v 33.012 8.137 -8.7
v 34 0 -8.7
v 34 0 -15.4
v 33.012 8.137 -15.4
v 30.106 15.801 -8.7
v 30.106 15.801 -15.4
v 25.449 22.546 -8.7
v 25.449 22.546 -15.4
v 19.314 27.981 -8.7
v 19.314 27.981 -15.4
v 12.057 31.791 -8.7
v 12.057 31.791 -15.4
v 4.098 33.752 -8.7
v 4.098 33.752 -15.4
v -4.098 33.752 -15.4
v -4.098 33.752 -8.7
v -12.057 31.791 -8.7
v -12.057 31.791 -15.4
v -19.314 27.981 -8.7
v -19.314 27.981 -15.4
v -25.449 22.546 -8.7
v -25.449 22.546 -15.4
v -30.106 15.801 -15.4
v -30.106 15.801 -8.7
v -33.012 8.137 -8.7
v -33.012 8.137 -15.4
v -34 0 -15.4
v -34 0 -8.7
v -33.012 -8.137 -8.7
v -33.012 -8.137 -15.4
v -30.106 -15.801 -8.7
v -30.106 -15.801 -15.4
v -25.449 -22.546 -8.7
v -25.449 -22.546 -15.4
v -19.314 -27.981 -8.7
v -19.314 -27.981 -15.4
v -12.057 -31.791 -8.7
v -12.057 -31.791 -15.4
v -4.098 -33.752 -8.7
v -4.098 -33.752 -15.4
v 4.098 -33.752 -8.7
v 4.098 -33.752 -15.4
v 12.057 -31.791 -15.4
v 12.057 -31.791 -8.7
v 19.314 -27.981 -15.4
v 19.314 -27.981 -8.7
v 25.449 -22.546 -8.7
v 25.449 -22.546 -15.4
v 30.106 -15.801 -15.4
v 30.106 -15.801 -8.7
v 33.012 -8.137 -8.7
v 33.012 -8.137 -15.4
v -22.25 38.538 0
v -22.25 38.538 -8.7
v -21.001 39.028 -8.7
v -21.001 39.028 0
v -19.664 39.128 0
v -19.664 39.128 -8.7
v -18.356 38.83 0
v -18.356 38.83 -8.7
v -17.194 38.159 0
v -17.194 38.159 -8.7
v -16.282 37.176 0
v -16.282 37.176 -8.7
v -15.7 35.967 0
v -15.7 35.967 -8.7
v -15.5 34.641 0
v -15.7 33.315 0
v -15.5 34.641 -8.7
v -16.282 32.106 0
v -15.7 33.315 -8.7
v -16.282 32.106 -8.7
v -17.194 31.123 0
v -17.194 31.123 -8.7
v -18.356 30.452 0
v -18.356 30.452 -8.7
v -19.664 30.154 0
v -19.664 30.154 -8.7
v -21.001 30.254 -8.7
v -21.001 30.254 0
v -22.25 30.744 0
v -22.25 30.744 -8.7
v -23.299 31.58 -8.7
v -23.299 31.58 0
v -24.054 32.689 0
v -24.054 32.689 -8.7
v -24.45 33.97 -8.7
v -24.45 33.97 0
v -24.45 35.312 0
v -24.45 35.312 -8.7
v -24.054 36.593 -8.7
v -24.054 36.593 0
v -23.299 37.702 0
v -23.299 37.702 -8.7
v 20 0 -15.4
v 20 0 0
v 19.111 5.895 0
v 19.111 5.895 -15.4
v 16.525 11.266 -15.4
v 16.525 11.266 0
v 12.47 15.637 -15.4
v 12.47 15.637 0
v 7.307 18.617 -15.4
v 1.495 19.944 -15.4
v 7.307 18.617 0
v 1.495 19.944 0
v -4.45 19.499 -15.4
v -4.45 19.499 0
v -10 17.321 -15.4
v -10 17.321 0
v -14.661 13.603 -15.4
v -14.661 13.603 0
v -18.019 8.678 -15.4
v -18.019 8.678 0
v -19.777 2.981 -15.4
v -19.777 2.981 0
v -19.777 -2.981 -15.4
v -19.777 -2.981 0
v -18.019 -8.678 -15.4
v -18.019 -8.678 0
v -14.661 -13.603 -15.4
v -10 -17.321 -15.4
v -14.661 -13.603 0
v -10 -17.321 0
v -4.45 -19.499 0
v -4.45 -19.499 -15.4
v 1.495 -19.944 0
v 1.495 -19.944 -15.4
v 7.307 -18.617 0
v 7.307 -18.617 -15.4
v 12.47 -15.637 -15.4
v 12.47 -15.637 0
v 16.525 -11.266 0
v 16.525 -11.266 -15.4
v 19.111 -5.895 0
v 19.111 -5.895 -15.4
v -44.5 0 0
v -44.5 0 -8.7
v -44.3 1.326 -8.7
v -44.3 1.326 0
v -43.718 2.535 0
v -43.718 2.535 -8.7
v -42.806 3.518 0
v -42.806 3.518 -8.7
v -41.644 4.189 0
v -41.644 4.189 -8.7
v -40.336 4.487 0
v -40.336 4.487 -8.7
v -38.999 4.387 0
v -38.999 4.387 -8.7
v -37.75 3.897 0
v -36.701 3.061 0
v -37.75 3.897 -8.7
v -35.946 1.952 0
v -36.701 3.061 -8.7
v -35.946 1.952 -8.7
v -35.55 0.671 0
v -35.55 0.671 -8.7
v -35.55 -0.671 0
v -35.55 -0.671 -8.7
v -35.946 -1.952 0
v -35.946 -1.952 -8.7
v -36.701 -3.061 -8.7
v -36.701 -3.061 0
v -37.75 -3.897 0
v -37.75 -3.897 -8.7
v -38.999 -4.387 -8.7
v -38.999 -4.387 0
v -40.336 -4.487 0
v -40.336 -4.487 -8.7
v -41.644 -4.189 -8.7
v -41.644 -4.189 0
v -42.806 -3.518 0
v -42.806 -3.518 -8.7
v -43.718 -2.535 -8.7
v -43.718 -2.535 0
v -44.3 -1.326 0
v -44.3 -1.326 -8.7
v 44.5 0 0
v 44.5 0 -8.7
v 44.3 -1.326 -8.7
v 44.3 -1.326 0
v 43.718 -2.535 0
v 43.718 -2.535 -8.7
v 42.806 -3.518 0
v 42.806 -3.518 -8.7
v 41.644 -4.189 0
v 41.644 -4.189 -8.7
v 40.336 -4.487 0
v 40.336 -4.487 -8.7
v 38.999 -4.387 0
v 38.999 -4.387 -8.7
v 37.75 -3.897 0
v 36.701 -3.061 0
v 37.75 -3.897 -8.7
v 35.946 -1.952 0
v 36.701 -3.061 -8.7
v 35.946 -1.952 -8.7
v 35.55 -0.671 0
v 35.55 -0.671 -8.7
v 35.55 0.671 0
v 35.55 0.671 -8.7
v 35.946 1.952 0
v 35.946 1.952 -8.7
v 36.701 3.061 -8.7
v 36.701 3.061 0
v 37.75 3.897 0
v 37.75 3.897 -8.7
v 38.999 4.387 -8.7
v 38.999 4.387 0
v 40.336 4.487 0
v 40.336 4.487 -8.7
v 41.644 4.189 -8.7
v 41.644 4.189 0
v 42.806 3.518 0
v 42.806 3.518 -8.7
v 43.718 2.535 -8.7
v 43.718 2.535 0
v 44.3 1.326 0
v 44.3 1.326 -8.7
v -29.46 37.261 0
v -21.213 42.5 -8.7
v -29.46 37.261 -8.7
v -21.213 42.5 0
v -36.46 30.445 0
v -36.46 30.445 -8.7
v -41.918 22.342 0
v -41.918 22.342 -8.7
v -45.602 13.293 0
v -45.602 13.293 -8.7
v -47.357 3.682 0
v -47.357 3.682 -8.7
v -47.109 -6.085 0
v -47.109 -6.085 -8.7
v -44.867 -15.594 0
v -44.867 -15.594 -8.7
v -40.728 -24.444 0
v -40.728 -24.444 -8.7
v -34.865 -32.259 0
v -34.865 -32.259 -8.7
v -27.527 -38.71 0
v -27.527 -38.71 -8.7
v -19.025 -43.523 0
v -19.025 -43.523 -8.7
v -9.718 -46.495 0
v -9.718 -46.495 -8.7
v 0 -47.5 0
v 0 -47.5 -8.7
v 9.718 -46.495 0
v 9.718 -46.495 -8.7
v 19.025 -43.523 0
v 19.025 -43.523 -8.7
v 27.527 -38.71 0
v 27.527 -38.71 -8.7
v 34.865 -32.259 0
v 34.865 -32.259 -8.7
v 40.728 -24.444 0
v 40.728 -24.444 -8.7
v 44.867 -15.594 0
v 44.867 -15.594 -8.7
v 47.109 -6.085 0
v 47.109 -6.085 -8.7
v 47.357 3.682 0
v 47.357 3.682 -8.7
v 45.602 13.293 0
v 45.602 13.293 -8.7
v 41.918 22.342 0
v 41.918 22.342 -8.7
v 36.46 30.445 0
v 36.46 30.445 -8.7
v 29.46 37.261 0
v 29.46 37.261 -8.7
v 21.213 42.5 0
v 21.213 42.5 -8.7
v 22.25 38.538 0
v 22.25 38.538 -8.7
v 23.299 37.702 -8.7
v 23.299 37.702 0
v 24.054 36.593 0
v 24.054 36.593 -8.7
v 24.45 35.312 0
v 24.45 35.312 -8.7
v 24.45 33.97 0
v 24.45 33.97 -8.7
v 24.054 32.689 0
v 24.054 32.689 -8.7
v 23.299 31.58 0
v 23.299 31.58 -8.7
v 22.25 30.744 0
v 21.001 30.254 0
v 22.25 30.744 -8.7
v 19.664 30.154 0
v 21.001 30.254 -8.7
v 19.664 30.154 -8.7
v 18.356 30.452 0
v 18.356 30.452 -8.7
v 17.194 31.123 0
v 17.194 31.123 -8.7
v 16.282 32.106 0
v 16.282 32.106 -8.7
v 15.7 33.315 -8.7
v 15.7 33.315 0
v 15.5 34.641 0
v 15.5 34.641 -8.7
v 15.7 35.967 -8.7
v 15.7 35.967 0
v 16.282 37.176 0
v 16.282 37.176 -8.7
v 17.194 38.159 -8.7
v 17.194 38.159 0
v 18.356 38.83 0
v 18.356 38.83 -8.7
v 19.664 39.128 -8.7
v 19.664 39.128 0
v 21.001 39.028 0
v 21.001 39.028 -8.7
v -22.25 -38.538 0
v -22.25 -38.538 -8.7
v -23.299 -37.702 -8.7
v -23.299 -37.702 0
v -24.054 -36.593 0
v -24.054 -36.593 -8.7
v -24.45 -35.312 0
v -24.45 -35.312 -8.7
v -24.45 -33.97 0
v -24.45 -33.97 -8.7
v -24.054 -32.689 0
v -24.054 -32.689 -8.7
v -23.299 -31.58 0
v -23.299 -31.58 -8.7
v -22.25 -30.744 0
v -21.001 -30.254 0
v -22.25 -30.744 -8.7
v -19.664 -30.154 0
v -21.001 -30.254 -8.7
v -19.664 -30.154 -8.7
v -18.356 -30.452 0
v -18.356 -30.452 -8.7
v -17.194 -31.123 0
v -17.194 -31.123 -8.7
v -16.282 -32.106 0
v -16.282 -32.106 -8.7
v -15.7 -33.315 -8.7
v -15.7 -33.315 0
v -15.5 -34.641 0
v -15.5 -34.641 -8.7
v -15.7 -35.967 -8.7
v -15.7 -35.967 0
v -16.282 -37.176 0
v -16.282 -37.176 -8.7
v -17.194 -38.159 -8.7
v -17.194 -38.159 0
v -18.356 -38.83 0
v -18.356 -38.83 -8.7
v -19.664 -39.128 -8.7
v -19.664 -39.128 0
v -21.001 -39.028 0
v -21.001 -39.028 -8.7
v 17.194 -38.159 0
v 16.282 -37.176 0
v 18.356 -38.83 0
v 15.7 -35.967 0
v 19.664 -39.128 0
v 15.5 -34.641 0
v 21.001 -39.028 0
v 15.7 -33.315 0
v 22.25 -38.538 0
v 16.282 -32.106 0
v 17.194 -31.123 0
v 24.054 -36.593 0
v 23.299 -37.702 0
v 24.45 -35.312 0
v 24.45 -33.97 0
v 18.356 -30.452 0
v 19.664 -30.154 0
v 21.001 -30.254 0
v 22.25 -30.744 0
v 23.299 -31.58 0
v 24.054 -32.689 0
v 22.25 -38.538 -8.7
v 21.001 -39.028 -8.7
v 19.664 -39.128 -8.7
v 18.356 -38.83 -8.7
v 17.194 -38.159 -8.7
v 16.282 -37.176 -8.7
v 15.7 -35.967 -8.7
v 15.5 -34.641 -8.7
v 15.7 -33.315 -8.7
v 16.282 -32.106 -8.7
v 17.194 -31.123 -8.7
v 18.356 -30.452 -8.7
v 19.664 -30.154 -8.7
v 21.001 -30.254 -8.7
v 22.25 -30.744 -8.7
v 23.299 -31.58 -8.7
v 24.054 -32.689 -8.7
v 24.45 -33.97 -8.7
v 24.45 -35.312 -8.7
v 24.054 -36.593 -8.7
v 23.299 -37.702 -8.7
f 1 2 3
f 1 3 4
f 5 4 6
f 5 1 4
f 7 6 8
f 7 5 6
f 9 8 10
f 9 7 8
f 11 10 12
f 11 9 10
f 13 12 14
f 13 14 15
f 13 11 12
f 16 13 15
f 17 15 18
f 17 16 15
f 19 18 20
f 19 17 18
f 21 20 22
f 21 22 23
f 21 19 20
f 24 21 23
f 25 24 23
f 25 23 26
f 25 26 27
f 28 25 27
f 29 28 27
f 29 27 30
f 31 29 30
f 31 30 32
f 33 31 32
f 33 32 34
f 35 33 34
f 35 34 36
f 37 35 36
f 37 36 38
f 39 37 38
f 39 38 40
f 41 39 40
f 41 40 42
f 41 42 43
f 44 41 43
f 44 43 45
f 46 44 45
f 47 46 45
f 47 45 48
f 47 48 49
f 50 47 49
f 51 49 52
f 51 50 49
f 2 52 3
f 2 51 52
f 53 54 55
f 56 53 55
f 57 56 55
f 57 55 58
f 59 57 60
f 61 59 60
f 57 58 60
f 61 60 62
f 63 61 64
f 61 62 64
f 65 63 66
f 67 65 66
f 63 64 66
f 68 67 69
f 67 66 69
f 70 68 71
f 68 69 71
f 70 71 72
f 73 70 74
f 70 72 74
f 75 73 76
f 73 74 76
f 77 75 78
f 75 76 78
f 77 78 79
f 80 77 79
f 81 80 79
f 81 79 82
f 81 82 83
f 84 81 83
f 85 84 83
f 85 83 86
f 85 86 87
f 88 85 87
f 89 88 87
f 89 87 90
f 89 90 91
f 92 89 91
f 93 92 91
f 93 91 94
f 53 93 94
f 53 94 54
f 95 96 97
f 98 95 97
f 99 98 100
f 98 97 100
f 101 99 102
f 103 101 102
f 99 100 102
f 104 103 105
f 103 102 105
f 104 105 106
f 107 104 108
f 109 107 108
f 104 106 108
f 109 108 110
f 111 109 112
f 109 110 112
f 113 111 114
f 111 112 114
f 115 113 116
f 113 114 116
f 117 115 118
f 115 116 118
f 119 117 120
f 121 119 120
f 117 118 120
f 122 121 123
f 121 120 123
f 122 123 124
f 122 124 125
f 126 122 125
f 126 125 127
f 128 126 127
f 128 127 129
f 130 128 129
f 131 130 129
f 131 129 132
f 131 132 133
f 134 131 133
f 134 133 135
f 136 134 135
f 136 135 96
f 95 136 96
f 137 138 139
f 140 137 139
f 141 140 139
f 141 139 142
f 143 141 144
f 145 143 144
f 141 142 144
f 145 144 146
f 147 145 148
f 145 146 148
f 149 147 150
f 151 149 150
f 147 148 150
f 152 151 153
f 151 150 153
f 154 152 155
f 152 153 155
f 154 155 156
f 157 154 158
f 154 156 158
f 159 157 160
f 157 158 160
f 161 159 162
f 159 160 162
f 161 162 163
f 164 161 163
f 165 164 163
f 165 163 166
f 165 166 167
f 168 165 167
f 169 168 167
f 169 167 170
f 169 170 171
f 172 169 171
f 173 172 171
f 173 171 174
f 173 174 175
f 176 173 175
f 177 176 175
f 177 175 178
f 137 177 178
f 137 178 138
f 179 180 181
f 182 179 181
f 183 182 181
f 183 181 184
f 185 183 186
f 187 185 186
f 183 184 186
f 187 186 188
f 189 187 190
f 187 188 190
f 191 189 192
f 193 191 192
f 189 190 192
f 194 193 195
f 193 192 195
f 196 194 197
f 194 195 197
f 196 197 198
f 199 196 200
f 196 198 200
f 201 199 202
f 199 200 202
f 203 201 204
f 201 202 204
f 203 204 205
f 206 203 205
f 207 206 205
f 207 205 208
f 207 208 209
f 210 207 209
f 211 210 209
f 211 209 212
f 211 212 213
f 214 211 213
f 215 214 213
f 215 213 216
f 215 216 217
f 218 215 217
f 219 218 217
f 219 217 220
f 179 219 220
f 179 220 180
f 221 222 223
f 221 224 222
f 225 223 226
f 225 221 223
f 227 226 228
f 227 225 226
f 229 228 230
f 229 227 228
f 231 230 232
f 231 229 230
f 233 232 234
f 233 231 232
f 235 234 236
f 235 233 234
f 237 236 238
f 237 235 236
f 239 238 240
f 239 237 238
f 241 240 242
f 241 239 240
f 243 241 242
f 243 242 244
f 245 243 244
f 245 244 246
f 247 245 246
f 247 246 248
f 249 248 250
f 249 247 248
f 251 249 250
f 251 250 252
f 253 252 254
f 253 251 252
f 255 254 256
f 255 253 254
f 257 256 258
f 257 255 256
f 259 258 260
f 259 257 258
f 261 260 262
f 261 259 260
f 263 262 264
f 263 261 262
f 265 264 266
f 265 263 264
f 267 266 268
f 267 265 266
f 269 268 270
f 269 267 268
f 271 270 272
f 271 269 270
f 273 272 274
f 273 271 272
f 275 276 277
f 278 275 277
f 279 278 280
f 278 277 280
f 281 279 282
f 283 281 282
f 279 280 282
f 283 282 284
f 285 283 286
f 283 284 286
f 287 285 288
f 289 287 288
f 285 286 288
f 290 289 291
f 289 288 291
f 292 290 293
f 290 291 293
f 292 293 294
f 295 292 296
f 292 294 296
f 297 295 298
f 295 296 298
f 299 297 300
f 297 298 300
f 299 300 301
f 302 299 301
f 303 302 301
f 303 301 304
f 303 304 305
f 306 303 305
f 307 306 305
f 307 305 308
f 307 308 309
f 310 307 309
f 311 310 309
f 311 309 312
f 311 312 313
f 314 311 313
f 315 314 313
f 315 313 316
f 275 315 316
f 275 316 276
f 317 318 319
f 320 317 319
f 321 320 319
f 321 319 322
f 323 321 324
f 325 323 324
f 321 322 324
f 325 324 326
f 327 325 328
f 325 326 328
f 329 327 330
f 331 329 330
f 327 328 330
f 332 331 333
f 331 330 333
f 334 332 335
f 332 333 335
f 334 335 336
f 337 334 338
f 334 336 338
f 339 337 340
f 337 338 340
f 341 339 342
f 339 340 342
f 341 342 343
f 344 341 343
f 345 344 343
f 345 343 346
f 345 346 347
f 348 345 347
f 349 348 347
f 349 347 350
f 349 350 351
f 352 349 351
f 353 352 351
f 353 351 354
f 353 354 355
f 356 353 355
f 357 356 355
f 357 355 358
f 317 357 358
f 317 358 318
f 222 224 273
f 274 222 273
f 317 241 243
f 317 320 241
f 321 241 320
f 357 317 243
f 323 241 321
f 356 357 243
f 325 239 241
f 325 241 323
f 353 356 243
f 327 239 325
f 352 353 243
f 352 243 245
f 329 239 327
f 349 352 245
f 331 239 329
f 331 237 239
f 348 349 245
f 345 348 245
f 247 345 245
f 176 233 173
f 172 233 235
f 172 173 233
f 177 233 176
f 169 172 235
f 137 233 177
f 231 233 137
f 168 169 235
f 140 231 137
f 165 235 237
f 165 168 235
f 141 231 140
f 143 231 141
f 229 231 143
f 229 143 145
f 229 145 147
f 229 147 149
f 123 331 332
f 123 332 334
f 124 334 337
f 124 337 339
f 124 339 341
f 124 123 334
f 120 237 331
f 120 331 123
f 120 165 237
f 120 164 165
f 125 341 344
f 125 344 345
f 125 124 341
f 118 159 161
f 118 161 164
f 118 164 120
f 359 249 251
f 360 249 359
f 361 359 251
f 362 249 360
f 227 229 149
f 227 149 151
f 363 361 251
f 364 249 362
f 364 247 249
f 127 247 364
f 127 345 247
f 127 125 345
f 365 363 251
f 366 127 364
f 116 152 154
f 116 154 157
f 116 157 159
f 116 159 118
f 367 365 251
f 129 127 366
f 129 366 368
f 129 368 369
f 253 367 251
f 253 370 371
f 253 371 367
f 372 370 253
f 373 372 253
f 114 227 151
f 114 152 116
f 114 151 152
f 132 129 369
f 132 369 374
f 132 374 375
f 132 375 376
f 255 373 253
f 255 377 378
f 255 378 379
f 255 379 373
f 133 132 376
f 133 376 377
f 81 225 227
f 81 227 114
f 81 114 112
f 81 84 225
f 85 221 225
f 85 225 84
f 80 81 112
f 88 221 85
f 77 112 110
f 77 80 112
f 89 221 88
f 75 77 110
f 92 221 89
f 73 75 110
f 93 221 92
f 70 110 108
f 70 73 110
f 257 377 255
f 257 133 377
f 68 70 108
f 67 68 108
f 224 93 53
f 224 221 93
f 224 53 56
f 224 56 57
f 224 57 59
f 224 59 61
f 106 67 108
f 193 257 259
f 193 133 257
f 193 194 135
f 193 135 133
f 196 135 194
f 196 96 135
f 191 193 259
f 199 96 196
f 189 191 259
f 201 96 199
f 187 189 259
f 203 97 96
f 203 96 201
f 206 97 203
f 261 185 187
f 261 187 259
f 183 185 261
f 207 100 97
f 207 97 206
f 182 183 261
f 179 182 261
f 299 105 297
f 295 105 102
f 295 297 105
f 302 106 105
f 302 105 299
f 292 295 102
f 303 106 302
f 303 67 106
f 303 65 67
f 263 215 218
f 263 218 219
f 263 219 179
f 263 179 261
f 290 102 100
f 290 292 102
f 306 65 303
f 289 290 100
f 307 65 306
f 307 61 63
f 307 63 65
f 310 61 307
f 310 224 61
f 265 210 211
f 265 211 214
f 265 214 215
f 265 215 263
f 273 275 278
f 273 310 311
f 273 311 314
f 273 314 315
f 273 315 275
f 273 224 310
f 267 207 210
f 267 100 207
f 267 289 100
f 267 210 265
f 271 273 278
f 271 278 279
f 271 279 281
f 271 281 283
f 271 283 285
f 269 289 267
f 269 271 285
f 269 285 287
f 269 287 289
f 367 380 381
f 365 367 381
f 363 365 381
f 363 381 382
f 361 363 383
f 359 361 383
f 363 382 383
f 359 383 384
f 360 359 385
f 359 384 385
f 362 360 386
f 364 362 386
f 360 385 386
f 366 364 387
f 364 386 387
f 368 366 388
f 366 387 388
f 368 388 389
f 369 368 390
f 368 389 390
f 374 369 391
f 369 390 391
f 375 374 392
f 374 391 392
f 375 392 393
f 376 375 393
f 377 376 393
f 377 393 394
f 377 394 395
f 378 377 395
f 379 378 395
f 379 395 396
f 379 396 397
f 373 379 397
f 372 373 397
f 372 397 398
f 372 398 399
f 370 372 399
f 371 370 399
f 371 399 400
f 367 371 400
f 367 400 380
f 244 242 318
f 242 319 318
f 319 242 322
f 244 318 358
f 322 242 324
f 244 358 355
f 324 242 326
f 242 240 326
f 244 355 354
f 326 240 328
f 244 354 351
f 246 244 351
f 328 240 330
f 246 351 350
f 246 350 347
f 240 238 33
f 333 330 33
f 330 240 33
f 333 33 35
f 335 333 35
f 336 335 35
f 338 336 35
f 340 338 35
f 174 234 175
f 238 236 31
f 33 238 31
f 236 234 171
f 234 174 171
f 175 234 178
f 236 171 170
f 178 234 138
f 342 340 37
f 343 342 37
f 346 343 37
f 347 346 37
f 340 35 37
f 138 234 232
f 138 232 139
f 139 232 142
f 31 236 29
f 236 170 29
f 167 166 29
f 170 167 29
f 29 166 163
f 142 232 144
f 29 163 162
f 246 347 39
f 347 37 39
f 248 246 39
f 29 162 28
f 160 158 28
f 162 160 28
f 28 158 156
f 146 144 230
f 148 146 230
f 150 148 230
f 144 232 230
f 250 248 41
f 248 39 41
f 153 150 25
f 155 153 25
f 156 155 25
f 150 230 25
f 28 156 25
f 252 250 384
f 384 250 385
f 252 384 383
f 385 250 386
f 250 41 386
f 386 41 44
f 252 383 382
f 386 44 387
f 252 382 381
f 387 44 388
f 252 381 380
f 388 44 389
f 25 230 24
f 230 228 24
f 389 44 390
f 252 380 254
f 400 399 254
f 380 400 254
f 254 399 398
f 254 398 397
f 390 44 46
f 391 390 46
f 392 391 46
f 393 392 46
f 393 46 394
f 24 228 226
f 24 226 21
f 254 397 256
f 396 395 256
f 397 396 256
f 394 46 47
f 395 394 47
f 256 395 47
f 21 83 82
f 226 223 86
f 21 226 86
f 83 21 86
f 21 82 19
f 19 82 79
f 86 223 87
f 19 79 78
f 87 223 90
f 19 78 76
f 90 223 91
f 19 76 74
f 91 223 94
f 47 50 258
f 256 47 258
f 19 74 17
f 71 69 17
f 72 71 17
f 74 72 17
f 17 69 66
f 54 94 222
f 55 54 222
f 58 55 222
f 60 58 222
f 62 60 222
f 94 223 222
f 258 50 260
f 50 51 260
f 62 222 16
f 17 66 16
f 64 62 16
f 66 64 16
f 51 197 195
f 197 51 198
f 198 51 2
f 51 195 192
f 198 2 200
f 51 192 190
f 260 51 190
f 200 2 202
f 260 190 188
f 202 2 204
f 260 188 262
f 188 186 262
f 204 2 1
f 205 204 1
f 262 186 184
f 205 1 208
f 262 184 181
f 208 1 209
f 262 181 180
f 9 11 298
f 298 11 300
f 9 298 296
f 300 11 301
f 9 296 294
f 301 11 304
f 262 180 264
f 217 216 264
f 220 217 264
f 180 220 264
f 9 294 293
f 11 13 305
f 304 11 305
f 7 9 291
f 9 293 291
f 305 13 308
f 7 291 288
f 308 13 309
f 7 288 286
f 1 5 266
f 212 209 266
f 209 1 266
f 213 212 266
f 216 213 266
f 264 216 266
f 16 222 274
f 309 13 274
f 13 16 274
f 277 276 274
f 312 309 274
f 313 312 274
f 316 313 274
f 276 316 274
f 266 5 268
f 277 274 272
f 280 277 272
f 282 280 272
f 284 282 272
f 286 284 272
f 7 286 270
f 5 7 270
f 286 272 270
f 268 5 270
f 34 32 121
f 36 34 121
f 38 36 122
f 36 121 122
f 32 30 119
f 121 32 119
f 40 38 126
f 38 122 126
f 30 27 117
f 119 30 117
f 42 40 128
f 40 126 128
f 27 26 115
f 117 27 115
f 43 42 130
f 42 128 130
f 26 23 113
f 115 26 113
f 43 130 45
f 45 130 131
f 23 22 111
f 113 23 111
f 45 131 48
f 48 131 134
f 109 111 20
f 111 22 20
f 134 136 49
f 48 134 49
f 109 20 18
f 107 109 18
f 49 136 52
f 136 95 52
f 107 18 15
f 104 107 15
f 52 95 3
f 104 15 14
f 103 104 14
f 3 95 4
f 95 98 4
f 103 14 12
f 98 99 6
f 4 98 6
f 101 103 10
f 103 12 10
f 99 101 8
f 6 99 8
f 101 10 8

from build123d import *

# Parameters (mm, degrees)
F0_R            = 47.5
F1_DEPTH        = 8.7
F2_R            = 34
F3_DEPTH        = 15.4
F5_DEPTH        = 15.401
F6_R            = 20
F7_DEPTH        = 15.401
F9_D            = 9
F9_COPIES_COUNT = 6


# Not quite as in the source:
# - a pattern or mirror of a feature is missing from the dataset's text; its kind, count and spacing are read off the source's solid


with BuildPart() as f1:
    # F0 (on Top) → F1 (new body)
    with BuildSketch(Plane.XY):
        Circle(F0_R)
    extrude(amount=-F1_DEPTH)

    # F2 (on face) → F3 (join)
    with BuildSketch(Plane.XY):
        Circle(F2_R)
    extrude(amount=-F3_DEPTH)

    # F4 (on face) → F5 (cut, through all)
    with BuildSketch(Plane.XY):
        with BuildLine():
            Line((-21.2132034356, 42.5), (21.2132034356, 42.5))
            ThreePointArc((21.2132034356, 42.5), (0, 47.5), (-21.2132034356, 42.5))
        make_face()
    extrude(amount=-F5_DEPTH, mode=Mode.SUBTRACT)

    # F6 (on face) → F7 (cut, through all)
    with BuildSketch(Plane.XY):
        Circle(F6_R)
    extrude(amount=-F7_DEPTH, mode=Mode.SUBTRACT)

    # F9 (through all)
    with Locations(Plane.XY):
        with Locations((-40, 0)):
            f9 = Hole(F9_D / 2)

    # F9_copies: F9 ×6 about axis
    f9_copies_axis = Axis((0, 0, 0), (0, 0, 1))
    for i in range(1, F9_COPIES_COUNT):
        add(f9.rotate(f9_copies_axis, i * 360 / F9_COPIES_COUNT), mode=Mode.SUBTRACT)


solid = f1.part
